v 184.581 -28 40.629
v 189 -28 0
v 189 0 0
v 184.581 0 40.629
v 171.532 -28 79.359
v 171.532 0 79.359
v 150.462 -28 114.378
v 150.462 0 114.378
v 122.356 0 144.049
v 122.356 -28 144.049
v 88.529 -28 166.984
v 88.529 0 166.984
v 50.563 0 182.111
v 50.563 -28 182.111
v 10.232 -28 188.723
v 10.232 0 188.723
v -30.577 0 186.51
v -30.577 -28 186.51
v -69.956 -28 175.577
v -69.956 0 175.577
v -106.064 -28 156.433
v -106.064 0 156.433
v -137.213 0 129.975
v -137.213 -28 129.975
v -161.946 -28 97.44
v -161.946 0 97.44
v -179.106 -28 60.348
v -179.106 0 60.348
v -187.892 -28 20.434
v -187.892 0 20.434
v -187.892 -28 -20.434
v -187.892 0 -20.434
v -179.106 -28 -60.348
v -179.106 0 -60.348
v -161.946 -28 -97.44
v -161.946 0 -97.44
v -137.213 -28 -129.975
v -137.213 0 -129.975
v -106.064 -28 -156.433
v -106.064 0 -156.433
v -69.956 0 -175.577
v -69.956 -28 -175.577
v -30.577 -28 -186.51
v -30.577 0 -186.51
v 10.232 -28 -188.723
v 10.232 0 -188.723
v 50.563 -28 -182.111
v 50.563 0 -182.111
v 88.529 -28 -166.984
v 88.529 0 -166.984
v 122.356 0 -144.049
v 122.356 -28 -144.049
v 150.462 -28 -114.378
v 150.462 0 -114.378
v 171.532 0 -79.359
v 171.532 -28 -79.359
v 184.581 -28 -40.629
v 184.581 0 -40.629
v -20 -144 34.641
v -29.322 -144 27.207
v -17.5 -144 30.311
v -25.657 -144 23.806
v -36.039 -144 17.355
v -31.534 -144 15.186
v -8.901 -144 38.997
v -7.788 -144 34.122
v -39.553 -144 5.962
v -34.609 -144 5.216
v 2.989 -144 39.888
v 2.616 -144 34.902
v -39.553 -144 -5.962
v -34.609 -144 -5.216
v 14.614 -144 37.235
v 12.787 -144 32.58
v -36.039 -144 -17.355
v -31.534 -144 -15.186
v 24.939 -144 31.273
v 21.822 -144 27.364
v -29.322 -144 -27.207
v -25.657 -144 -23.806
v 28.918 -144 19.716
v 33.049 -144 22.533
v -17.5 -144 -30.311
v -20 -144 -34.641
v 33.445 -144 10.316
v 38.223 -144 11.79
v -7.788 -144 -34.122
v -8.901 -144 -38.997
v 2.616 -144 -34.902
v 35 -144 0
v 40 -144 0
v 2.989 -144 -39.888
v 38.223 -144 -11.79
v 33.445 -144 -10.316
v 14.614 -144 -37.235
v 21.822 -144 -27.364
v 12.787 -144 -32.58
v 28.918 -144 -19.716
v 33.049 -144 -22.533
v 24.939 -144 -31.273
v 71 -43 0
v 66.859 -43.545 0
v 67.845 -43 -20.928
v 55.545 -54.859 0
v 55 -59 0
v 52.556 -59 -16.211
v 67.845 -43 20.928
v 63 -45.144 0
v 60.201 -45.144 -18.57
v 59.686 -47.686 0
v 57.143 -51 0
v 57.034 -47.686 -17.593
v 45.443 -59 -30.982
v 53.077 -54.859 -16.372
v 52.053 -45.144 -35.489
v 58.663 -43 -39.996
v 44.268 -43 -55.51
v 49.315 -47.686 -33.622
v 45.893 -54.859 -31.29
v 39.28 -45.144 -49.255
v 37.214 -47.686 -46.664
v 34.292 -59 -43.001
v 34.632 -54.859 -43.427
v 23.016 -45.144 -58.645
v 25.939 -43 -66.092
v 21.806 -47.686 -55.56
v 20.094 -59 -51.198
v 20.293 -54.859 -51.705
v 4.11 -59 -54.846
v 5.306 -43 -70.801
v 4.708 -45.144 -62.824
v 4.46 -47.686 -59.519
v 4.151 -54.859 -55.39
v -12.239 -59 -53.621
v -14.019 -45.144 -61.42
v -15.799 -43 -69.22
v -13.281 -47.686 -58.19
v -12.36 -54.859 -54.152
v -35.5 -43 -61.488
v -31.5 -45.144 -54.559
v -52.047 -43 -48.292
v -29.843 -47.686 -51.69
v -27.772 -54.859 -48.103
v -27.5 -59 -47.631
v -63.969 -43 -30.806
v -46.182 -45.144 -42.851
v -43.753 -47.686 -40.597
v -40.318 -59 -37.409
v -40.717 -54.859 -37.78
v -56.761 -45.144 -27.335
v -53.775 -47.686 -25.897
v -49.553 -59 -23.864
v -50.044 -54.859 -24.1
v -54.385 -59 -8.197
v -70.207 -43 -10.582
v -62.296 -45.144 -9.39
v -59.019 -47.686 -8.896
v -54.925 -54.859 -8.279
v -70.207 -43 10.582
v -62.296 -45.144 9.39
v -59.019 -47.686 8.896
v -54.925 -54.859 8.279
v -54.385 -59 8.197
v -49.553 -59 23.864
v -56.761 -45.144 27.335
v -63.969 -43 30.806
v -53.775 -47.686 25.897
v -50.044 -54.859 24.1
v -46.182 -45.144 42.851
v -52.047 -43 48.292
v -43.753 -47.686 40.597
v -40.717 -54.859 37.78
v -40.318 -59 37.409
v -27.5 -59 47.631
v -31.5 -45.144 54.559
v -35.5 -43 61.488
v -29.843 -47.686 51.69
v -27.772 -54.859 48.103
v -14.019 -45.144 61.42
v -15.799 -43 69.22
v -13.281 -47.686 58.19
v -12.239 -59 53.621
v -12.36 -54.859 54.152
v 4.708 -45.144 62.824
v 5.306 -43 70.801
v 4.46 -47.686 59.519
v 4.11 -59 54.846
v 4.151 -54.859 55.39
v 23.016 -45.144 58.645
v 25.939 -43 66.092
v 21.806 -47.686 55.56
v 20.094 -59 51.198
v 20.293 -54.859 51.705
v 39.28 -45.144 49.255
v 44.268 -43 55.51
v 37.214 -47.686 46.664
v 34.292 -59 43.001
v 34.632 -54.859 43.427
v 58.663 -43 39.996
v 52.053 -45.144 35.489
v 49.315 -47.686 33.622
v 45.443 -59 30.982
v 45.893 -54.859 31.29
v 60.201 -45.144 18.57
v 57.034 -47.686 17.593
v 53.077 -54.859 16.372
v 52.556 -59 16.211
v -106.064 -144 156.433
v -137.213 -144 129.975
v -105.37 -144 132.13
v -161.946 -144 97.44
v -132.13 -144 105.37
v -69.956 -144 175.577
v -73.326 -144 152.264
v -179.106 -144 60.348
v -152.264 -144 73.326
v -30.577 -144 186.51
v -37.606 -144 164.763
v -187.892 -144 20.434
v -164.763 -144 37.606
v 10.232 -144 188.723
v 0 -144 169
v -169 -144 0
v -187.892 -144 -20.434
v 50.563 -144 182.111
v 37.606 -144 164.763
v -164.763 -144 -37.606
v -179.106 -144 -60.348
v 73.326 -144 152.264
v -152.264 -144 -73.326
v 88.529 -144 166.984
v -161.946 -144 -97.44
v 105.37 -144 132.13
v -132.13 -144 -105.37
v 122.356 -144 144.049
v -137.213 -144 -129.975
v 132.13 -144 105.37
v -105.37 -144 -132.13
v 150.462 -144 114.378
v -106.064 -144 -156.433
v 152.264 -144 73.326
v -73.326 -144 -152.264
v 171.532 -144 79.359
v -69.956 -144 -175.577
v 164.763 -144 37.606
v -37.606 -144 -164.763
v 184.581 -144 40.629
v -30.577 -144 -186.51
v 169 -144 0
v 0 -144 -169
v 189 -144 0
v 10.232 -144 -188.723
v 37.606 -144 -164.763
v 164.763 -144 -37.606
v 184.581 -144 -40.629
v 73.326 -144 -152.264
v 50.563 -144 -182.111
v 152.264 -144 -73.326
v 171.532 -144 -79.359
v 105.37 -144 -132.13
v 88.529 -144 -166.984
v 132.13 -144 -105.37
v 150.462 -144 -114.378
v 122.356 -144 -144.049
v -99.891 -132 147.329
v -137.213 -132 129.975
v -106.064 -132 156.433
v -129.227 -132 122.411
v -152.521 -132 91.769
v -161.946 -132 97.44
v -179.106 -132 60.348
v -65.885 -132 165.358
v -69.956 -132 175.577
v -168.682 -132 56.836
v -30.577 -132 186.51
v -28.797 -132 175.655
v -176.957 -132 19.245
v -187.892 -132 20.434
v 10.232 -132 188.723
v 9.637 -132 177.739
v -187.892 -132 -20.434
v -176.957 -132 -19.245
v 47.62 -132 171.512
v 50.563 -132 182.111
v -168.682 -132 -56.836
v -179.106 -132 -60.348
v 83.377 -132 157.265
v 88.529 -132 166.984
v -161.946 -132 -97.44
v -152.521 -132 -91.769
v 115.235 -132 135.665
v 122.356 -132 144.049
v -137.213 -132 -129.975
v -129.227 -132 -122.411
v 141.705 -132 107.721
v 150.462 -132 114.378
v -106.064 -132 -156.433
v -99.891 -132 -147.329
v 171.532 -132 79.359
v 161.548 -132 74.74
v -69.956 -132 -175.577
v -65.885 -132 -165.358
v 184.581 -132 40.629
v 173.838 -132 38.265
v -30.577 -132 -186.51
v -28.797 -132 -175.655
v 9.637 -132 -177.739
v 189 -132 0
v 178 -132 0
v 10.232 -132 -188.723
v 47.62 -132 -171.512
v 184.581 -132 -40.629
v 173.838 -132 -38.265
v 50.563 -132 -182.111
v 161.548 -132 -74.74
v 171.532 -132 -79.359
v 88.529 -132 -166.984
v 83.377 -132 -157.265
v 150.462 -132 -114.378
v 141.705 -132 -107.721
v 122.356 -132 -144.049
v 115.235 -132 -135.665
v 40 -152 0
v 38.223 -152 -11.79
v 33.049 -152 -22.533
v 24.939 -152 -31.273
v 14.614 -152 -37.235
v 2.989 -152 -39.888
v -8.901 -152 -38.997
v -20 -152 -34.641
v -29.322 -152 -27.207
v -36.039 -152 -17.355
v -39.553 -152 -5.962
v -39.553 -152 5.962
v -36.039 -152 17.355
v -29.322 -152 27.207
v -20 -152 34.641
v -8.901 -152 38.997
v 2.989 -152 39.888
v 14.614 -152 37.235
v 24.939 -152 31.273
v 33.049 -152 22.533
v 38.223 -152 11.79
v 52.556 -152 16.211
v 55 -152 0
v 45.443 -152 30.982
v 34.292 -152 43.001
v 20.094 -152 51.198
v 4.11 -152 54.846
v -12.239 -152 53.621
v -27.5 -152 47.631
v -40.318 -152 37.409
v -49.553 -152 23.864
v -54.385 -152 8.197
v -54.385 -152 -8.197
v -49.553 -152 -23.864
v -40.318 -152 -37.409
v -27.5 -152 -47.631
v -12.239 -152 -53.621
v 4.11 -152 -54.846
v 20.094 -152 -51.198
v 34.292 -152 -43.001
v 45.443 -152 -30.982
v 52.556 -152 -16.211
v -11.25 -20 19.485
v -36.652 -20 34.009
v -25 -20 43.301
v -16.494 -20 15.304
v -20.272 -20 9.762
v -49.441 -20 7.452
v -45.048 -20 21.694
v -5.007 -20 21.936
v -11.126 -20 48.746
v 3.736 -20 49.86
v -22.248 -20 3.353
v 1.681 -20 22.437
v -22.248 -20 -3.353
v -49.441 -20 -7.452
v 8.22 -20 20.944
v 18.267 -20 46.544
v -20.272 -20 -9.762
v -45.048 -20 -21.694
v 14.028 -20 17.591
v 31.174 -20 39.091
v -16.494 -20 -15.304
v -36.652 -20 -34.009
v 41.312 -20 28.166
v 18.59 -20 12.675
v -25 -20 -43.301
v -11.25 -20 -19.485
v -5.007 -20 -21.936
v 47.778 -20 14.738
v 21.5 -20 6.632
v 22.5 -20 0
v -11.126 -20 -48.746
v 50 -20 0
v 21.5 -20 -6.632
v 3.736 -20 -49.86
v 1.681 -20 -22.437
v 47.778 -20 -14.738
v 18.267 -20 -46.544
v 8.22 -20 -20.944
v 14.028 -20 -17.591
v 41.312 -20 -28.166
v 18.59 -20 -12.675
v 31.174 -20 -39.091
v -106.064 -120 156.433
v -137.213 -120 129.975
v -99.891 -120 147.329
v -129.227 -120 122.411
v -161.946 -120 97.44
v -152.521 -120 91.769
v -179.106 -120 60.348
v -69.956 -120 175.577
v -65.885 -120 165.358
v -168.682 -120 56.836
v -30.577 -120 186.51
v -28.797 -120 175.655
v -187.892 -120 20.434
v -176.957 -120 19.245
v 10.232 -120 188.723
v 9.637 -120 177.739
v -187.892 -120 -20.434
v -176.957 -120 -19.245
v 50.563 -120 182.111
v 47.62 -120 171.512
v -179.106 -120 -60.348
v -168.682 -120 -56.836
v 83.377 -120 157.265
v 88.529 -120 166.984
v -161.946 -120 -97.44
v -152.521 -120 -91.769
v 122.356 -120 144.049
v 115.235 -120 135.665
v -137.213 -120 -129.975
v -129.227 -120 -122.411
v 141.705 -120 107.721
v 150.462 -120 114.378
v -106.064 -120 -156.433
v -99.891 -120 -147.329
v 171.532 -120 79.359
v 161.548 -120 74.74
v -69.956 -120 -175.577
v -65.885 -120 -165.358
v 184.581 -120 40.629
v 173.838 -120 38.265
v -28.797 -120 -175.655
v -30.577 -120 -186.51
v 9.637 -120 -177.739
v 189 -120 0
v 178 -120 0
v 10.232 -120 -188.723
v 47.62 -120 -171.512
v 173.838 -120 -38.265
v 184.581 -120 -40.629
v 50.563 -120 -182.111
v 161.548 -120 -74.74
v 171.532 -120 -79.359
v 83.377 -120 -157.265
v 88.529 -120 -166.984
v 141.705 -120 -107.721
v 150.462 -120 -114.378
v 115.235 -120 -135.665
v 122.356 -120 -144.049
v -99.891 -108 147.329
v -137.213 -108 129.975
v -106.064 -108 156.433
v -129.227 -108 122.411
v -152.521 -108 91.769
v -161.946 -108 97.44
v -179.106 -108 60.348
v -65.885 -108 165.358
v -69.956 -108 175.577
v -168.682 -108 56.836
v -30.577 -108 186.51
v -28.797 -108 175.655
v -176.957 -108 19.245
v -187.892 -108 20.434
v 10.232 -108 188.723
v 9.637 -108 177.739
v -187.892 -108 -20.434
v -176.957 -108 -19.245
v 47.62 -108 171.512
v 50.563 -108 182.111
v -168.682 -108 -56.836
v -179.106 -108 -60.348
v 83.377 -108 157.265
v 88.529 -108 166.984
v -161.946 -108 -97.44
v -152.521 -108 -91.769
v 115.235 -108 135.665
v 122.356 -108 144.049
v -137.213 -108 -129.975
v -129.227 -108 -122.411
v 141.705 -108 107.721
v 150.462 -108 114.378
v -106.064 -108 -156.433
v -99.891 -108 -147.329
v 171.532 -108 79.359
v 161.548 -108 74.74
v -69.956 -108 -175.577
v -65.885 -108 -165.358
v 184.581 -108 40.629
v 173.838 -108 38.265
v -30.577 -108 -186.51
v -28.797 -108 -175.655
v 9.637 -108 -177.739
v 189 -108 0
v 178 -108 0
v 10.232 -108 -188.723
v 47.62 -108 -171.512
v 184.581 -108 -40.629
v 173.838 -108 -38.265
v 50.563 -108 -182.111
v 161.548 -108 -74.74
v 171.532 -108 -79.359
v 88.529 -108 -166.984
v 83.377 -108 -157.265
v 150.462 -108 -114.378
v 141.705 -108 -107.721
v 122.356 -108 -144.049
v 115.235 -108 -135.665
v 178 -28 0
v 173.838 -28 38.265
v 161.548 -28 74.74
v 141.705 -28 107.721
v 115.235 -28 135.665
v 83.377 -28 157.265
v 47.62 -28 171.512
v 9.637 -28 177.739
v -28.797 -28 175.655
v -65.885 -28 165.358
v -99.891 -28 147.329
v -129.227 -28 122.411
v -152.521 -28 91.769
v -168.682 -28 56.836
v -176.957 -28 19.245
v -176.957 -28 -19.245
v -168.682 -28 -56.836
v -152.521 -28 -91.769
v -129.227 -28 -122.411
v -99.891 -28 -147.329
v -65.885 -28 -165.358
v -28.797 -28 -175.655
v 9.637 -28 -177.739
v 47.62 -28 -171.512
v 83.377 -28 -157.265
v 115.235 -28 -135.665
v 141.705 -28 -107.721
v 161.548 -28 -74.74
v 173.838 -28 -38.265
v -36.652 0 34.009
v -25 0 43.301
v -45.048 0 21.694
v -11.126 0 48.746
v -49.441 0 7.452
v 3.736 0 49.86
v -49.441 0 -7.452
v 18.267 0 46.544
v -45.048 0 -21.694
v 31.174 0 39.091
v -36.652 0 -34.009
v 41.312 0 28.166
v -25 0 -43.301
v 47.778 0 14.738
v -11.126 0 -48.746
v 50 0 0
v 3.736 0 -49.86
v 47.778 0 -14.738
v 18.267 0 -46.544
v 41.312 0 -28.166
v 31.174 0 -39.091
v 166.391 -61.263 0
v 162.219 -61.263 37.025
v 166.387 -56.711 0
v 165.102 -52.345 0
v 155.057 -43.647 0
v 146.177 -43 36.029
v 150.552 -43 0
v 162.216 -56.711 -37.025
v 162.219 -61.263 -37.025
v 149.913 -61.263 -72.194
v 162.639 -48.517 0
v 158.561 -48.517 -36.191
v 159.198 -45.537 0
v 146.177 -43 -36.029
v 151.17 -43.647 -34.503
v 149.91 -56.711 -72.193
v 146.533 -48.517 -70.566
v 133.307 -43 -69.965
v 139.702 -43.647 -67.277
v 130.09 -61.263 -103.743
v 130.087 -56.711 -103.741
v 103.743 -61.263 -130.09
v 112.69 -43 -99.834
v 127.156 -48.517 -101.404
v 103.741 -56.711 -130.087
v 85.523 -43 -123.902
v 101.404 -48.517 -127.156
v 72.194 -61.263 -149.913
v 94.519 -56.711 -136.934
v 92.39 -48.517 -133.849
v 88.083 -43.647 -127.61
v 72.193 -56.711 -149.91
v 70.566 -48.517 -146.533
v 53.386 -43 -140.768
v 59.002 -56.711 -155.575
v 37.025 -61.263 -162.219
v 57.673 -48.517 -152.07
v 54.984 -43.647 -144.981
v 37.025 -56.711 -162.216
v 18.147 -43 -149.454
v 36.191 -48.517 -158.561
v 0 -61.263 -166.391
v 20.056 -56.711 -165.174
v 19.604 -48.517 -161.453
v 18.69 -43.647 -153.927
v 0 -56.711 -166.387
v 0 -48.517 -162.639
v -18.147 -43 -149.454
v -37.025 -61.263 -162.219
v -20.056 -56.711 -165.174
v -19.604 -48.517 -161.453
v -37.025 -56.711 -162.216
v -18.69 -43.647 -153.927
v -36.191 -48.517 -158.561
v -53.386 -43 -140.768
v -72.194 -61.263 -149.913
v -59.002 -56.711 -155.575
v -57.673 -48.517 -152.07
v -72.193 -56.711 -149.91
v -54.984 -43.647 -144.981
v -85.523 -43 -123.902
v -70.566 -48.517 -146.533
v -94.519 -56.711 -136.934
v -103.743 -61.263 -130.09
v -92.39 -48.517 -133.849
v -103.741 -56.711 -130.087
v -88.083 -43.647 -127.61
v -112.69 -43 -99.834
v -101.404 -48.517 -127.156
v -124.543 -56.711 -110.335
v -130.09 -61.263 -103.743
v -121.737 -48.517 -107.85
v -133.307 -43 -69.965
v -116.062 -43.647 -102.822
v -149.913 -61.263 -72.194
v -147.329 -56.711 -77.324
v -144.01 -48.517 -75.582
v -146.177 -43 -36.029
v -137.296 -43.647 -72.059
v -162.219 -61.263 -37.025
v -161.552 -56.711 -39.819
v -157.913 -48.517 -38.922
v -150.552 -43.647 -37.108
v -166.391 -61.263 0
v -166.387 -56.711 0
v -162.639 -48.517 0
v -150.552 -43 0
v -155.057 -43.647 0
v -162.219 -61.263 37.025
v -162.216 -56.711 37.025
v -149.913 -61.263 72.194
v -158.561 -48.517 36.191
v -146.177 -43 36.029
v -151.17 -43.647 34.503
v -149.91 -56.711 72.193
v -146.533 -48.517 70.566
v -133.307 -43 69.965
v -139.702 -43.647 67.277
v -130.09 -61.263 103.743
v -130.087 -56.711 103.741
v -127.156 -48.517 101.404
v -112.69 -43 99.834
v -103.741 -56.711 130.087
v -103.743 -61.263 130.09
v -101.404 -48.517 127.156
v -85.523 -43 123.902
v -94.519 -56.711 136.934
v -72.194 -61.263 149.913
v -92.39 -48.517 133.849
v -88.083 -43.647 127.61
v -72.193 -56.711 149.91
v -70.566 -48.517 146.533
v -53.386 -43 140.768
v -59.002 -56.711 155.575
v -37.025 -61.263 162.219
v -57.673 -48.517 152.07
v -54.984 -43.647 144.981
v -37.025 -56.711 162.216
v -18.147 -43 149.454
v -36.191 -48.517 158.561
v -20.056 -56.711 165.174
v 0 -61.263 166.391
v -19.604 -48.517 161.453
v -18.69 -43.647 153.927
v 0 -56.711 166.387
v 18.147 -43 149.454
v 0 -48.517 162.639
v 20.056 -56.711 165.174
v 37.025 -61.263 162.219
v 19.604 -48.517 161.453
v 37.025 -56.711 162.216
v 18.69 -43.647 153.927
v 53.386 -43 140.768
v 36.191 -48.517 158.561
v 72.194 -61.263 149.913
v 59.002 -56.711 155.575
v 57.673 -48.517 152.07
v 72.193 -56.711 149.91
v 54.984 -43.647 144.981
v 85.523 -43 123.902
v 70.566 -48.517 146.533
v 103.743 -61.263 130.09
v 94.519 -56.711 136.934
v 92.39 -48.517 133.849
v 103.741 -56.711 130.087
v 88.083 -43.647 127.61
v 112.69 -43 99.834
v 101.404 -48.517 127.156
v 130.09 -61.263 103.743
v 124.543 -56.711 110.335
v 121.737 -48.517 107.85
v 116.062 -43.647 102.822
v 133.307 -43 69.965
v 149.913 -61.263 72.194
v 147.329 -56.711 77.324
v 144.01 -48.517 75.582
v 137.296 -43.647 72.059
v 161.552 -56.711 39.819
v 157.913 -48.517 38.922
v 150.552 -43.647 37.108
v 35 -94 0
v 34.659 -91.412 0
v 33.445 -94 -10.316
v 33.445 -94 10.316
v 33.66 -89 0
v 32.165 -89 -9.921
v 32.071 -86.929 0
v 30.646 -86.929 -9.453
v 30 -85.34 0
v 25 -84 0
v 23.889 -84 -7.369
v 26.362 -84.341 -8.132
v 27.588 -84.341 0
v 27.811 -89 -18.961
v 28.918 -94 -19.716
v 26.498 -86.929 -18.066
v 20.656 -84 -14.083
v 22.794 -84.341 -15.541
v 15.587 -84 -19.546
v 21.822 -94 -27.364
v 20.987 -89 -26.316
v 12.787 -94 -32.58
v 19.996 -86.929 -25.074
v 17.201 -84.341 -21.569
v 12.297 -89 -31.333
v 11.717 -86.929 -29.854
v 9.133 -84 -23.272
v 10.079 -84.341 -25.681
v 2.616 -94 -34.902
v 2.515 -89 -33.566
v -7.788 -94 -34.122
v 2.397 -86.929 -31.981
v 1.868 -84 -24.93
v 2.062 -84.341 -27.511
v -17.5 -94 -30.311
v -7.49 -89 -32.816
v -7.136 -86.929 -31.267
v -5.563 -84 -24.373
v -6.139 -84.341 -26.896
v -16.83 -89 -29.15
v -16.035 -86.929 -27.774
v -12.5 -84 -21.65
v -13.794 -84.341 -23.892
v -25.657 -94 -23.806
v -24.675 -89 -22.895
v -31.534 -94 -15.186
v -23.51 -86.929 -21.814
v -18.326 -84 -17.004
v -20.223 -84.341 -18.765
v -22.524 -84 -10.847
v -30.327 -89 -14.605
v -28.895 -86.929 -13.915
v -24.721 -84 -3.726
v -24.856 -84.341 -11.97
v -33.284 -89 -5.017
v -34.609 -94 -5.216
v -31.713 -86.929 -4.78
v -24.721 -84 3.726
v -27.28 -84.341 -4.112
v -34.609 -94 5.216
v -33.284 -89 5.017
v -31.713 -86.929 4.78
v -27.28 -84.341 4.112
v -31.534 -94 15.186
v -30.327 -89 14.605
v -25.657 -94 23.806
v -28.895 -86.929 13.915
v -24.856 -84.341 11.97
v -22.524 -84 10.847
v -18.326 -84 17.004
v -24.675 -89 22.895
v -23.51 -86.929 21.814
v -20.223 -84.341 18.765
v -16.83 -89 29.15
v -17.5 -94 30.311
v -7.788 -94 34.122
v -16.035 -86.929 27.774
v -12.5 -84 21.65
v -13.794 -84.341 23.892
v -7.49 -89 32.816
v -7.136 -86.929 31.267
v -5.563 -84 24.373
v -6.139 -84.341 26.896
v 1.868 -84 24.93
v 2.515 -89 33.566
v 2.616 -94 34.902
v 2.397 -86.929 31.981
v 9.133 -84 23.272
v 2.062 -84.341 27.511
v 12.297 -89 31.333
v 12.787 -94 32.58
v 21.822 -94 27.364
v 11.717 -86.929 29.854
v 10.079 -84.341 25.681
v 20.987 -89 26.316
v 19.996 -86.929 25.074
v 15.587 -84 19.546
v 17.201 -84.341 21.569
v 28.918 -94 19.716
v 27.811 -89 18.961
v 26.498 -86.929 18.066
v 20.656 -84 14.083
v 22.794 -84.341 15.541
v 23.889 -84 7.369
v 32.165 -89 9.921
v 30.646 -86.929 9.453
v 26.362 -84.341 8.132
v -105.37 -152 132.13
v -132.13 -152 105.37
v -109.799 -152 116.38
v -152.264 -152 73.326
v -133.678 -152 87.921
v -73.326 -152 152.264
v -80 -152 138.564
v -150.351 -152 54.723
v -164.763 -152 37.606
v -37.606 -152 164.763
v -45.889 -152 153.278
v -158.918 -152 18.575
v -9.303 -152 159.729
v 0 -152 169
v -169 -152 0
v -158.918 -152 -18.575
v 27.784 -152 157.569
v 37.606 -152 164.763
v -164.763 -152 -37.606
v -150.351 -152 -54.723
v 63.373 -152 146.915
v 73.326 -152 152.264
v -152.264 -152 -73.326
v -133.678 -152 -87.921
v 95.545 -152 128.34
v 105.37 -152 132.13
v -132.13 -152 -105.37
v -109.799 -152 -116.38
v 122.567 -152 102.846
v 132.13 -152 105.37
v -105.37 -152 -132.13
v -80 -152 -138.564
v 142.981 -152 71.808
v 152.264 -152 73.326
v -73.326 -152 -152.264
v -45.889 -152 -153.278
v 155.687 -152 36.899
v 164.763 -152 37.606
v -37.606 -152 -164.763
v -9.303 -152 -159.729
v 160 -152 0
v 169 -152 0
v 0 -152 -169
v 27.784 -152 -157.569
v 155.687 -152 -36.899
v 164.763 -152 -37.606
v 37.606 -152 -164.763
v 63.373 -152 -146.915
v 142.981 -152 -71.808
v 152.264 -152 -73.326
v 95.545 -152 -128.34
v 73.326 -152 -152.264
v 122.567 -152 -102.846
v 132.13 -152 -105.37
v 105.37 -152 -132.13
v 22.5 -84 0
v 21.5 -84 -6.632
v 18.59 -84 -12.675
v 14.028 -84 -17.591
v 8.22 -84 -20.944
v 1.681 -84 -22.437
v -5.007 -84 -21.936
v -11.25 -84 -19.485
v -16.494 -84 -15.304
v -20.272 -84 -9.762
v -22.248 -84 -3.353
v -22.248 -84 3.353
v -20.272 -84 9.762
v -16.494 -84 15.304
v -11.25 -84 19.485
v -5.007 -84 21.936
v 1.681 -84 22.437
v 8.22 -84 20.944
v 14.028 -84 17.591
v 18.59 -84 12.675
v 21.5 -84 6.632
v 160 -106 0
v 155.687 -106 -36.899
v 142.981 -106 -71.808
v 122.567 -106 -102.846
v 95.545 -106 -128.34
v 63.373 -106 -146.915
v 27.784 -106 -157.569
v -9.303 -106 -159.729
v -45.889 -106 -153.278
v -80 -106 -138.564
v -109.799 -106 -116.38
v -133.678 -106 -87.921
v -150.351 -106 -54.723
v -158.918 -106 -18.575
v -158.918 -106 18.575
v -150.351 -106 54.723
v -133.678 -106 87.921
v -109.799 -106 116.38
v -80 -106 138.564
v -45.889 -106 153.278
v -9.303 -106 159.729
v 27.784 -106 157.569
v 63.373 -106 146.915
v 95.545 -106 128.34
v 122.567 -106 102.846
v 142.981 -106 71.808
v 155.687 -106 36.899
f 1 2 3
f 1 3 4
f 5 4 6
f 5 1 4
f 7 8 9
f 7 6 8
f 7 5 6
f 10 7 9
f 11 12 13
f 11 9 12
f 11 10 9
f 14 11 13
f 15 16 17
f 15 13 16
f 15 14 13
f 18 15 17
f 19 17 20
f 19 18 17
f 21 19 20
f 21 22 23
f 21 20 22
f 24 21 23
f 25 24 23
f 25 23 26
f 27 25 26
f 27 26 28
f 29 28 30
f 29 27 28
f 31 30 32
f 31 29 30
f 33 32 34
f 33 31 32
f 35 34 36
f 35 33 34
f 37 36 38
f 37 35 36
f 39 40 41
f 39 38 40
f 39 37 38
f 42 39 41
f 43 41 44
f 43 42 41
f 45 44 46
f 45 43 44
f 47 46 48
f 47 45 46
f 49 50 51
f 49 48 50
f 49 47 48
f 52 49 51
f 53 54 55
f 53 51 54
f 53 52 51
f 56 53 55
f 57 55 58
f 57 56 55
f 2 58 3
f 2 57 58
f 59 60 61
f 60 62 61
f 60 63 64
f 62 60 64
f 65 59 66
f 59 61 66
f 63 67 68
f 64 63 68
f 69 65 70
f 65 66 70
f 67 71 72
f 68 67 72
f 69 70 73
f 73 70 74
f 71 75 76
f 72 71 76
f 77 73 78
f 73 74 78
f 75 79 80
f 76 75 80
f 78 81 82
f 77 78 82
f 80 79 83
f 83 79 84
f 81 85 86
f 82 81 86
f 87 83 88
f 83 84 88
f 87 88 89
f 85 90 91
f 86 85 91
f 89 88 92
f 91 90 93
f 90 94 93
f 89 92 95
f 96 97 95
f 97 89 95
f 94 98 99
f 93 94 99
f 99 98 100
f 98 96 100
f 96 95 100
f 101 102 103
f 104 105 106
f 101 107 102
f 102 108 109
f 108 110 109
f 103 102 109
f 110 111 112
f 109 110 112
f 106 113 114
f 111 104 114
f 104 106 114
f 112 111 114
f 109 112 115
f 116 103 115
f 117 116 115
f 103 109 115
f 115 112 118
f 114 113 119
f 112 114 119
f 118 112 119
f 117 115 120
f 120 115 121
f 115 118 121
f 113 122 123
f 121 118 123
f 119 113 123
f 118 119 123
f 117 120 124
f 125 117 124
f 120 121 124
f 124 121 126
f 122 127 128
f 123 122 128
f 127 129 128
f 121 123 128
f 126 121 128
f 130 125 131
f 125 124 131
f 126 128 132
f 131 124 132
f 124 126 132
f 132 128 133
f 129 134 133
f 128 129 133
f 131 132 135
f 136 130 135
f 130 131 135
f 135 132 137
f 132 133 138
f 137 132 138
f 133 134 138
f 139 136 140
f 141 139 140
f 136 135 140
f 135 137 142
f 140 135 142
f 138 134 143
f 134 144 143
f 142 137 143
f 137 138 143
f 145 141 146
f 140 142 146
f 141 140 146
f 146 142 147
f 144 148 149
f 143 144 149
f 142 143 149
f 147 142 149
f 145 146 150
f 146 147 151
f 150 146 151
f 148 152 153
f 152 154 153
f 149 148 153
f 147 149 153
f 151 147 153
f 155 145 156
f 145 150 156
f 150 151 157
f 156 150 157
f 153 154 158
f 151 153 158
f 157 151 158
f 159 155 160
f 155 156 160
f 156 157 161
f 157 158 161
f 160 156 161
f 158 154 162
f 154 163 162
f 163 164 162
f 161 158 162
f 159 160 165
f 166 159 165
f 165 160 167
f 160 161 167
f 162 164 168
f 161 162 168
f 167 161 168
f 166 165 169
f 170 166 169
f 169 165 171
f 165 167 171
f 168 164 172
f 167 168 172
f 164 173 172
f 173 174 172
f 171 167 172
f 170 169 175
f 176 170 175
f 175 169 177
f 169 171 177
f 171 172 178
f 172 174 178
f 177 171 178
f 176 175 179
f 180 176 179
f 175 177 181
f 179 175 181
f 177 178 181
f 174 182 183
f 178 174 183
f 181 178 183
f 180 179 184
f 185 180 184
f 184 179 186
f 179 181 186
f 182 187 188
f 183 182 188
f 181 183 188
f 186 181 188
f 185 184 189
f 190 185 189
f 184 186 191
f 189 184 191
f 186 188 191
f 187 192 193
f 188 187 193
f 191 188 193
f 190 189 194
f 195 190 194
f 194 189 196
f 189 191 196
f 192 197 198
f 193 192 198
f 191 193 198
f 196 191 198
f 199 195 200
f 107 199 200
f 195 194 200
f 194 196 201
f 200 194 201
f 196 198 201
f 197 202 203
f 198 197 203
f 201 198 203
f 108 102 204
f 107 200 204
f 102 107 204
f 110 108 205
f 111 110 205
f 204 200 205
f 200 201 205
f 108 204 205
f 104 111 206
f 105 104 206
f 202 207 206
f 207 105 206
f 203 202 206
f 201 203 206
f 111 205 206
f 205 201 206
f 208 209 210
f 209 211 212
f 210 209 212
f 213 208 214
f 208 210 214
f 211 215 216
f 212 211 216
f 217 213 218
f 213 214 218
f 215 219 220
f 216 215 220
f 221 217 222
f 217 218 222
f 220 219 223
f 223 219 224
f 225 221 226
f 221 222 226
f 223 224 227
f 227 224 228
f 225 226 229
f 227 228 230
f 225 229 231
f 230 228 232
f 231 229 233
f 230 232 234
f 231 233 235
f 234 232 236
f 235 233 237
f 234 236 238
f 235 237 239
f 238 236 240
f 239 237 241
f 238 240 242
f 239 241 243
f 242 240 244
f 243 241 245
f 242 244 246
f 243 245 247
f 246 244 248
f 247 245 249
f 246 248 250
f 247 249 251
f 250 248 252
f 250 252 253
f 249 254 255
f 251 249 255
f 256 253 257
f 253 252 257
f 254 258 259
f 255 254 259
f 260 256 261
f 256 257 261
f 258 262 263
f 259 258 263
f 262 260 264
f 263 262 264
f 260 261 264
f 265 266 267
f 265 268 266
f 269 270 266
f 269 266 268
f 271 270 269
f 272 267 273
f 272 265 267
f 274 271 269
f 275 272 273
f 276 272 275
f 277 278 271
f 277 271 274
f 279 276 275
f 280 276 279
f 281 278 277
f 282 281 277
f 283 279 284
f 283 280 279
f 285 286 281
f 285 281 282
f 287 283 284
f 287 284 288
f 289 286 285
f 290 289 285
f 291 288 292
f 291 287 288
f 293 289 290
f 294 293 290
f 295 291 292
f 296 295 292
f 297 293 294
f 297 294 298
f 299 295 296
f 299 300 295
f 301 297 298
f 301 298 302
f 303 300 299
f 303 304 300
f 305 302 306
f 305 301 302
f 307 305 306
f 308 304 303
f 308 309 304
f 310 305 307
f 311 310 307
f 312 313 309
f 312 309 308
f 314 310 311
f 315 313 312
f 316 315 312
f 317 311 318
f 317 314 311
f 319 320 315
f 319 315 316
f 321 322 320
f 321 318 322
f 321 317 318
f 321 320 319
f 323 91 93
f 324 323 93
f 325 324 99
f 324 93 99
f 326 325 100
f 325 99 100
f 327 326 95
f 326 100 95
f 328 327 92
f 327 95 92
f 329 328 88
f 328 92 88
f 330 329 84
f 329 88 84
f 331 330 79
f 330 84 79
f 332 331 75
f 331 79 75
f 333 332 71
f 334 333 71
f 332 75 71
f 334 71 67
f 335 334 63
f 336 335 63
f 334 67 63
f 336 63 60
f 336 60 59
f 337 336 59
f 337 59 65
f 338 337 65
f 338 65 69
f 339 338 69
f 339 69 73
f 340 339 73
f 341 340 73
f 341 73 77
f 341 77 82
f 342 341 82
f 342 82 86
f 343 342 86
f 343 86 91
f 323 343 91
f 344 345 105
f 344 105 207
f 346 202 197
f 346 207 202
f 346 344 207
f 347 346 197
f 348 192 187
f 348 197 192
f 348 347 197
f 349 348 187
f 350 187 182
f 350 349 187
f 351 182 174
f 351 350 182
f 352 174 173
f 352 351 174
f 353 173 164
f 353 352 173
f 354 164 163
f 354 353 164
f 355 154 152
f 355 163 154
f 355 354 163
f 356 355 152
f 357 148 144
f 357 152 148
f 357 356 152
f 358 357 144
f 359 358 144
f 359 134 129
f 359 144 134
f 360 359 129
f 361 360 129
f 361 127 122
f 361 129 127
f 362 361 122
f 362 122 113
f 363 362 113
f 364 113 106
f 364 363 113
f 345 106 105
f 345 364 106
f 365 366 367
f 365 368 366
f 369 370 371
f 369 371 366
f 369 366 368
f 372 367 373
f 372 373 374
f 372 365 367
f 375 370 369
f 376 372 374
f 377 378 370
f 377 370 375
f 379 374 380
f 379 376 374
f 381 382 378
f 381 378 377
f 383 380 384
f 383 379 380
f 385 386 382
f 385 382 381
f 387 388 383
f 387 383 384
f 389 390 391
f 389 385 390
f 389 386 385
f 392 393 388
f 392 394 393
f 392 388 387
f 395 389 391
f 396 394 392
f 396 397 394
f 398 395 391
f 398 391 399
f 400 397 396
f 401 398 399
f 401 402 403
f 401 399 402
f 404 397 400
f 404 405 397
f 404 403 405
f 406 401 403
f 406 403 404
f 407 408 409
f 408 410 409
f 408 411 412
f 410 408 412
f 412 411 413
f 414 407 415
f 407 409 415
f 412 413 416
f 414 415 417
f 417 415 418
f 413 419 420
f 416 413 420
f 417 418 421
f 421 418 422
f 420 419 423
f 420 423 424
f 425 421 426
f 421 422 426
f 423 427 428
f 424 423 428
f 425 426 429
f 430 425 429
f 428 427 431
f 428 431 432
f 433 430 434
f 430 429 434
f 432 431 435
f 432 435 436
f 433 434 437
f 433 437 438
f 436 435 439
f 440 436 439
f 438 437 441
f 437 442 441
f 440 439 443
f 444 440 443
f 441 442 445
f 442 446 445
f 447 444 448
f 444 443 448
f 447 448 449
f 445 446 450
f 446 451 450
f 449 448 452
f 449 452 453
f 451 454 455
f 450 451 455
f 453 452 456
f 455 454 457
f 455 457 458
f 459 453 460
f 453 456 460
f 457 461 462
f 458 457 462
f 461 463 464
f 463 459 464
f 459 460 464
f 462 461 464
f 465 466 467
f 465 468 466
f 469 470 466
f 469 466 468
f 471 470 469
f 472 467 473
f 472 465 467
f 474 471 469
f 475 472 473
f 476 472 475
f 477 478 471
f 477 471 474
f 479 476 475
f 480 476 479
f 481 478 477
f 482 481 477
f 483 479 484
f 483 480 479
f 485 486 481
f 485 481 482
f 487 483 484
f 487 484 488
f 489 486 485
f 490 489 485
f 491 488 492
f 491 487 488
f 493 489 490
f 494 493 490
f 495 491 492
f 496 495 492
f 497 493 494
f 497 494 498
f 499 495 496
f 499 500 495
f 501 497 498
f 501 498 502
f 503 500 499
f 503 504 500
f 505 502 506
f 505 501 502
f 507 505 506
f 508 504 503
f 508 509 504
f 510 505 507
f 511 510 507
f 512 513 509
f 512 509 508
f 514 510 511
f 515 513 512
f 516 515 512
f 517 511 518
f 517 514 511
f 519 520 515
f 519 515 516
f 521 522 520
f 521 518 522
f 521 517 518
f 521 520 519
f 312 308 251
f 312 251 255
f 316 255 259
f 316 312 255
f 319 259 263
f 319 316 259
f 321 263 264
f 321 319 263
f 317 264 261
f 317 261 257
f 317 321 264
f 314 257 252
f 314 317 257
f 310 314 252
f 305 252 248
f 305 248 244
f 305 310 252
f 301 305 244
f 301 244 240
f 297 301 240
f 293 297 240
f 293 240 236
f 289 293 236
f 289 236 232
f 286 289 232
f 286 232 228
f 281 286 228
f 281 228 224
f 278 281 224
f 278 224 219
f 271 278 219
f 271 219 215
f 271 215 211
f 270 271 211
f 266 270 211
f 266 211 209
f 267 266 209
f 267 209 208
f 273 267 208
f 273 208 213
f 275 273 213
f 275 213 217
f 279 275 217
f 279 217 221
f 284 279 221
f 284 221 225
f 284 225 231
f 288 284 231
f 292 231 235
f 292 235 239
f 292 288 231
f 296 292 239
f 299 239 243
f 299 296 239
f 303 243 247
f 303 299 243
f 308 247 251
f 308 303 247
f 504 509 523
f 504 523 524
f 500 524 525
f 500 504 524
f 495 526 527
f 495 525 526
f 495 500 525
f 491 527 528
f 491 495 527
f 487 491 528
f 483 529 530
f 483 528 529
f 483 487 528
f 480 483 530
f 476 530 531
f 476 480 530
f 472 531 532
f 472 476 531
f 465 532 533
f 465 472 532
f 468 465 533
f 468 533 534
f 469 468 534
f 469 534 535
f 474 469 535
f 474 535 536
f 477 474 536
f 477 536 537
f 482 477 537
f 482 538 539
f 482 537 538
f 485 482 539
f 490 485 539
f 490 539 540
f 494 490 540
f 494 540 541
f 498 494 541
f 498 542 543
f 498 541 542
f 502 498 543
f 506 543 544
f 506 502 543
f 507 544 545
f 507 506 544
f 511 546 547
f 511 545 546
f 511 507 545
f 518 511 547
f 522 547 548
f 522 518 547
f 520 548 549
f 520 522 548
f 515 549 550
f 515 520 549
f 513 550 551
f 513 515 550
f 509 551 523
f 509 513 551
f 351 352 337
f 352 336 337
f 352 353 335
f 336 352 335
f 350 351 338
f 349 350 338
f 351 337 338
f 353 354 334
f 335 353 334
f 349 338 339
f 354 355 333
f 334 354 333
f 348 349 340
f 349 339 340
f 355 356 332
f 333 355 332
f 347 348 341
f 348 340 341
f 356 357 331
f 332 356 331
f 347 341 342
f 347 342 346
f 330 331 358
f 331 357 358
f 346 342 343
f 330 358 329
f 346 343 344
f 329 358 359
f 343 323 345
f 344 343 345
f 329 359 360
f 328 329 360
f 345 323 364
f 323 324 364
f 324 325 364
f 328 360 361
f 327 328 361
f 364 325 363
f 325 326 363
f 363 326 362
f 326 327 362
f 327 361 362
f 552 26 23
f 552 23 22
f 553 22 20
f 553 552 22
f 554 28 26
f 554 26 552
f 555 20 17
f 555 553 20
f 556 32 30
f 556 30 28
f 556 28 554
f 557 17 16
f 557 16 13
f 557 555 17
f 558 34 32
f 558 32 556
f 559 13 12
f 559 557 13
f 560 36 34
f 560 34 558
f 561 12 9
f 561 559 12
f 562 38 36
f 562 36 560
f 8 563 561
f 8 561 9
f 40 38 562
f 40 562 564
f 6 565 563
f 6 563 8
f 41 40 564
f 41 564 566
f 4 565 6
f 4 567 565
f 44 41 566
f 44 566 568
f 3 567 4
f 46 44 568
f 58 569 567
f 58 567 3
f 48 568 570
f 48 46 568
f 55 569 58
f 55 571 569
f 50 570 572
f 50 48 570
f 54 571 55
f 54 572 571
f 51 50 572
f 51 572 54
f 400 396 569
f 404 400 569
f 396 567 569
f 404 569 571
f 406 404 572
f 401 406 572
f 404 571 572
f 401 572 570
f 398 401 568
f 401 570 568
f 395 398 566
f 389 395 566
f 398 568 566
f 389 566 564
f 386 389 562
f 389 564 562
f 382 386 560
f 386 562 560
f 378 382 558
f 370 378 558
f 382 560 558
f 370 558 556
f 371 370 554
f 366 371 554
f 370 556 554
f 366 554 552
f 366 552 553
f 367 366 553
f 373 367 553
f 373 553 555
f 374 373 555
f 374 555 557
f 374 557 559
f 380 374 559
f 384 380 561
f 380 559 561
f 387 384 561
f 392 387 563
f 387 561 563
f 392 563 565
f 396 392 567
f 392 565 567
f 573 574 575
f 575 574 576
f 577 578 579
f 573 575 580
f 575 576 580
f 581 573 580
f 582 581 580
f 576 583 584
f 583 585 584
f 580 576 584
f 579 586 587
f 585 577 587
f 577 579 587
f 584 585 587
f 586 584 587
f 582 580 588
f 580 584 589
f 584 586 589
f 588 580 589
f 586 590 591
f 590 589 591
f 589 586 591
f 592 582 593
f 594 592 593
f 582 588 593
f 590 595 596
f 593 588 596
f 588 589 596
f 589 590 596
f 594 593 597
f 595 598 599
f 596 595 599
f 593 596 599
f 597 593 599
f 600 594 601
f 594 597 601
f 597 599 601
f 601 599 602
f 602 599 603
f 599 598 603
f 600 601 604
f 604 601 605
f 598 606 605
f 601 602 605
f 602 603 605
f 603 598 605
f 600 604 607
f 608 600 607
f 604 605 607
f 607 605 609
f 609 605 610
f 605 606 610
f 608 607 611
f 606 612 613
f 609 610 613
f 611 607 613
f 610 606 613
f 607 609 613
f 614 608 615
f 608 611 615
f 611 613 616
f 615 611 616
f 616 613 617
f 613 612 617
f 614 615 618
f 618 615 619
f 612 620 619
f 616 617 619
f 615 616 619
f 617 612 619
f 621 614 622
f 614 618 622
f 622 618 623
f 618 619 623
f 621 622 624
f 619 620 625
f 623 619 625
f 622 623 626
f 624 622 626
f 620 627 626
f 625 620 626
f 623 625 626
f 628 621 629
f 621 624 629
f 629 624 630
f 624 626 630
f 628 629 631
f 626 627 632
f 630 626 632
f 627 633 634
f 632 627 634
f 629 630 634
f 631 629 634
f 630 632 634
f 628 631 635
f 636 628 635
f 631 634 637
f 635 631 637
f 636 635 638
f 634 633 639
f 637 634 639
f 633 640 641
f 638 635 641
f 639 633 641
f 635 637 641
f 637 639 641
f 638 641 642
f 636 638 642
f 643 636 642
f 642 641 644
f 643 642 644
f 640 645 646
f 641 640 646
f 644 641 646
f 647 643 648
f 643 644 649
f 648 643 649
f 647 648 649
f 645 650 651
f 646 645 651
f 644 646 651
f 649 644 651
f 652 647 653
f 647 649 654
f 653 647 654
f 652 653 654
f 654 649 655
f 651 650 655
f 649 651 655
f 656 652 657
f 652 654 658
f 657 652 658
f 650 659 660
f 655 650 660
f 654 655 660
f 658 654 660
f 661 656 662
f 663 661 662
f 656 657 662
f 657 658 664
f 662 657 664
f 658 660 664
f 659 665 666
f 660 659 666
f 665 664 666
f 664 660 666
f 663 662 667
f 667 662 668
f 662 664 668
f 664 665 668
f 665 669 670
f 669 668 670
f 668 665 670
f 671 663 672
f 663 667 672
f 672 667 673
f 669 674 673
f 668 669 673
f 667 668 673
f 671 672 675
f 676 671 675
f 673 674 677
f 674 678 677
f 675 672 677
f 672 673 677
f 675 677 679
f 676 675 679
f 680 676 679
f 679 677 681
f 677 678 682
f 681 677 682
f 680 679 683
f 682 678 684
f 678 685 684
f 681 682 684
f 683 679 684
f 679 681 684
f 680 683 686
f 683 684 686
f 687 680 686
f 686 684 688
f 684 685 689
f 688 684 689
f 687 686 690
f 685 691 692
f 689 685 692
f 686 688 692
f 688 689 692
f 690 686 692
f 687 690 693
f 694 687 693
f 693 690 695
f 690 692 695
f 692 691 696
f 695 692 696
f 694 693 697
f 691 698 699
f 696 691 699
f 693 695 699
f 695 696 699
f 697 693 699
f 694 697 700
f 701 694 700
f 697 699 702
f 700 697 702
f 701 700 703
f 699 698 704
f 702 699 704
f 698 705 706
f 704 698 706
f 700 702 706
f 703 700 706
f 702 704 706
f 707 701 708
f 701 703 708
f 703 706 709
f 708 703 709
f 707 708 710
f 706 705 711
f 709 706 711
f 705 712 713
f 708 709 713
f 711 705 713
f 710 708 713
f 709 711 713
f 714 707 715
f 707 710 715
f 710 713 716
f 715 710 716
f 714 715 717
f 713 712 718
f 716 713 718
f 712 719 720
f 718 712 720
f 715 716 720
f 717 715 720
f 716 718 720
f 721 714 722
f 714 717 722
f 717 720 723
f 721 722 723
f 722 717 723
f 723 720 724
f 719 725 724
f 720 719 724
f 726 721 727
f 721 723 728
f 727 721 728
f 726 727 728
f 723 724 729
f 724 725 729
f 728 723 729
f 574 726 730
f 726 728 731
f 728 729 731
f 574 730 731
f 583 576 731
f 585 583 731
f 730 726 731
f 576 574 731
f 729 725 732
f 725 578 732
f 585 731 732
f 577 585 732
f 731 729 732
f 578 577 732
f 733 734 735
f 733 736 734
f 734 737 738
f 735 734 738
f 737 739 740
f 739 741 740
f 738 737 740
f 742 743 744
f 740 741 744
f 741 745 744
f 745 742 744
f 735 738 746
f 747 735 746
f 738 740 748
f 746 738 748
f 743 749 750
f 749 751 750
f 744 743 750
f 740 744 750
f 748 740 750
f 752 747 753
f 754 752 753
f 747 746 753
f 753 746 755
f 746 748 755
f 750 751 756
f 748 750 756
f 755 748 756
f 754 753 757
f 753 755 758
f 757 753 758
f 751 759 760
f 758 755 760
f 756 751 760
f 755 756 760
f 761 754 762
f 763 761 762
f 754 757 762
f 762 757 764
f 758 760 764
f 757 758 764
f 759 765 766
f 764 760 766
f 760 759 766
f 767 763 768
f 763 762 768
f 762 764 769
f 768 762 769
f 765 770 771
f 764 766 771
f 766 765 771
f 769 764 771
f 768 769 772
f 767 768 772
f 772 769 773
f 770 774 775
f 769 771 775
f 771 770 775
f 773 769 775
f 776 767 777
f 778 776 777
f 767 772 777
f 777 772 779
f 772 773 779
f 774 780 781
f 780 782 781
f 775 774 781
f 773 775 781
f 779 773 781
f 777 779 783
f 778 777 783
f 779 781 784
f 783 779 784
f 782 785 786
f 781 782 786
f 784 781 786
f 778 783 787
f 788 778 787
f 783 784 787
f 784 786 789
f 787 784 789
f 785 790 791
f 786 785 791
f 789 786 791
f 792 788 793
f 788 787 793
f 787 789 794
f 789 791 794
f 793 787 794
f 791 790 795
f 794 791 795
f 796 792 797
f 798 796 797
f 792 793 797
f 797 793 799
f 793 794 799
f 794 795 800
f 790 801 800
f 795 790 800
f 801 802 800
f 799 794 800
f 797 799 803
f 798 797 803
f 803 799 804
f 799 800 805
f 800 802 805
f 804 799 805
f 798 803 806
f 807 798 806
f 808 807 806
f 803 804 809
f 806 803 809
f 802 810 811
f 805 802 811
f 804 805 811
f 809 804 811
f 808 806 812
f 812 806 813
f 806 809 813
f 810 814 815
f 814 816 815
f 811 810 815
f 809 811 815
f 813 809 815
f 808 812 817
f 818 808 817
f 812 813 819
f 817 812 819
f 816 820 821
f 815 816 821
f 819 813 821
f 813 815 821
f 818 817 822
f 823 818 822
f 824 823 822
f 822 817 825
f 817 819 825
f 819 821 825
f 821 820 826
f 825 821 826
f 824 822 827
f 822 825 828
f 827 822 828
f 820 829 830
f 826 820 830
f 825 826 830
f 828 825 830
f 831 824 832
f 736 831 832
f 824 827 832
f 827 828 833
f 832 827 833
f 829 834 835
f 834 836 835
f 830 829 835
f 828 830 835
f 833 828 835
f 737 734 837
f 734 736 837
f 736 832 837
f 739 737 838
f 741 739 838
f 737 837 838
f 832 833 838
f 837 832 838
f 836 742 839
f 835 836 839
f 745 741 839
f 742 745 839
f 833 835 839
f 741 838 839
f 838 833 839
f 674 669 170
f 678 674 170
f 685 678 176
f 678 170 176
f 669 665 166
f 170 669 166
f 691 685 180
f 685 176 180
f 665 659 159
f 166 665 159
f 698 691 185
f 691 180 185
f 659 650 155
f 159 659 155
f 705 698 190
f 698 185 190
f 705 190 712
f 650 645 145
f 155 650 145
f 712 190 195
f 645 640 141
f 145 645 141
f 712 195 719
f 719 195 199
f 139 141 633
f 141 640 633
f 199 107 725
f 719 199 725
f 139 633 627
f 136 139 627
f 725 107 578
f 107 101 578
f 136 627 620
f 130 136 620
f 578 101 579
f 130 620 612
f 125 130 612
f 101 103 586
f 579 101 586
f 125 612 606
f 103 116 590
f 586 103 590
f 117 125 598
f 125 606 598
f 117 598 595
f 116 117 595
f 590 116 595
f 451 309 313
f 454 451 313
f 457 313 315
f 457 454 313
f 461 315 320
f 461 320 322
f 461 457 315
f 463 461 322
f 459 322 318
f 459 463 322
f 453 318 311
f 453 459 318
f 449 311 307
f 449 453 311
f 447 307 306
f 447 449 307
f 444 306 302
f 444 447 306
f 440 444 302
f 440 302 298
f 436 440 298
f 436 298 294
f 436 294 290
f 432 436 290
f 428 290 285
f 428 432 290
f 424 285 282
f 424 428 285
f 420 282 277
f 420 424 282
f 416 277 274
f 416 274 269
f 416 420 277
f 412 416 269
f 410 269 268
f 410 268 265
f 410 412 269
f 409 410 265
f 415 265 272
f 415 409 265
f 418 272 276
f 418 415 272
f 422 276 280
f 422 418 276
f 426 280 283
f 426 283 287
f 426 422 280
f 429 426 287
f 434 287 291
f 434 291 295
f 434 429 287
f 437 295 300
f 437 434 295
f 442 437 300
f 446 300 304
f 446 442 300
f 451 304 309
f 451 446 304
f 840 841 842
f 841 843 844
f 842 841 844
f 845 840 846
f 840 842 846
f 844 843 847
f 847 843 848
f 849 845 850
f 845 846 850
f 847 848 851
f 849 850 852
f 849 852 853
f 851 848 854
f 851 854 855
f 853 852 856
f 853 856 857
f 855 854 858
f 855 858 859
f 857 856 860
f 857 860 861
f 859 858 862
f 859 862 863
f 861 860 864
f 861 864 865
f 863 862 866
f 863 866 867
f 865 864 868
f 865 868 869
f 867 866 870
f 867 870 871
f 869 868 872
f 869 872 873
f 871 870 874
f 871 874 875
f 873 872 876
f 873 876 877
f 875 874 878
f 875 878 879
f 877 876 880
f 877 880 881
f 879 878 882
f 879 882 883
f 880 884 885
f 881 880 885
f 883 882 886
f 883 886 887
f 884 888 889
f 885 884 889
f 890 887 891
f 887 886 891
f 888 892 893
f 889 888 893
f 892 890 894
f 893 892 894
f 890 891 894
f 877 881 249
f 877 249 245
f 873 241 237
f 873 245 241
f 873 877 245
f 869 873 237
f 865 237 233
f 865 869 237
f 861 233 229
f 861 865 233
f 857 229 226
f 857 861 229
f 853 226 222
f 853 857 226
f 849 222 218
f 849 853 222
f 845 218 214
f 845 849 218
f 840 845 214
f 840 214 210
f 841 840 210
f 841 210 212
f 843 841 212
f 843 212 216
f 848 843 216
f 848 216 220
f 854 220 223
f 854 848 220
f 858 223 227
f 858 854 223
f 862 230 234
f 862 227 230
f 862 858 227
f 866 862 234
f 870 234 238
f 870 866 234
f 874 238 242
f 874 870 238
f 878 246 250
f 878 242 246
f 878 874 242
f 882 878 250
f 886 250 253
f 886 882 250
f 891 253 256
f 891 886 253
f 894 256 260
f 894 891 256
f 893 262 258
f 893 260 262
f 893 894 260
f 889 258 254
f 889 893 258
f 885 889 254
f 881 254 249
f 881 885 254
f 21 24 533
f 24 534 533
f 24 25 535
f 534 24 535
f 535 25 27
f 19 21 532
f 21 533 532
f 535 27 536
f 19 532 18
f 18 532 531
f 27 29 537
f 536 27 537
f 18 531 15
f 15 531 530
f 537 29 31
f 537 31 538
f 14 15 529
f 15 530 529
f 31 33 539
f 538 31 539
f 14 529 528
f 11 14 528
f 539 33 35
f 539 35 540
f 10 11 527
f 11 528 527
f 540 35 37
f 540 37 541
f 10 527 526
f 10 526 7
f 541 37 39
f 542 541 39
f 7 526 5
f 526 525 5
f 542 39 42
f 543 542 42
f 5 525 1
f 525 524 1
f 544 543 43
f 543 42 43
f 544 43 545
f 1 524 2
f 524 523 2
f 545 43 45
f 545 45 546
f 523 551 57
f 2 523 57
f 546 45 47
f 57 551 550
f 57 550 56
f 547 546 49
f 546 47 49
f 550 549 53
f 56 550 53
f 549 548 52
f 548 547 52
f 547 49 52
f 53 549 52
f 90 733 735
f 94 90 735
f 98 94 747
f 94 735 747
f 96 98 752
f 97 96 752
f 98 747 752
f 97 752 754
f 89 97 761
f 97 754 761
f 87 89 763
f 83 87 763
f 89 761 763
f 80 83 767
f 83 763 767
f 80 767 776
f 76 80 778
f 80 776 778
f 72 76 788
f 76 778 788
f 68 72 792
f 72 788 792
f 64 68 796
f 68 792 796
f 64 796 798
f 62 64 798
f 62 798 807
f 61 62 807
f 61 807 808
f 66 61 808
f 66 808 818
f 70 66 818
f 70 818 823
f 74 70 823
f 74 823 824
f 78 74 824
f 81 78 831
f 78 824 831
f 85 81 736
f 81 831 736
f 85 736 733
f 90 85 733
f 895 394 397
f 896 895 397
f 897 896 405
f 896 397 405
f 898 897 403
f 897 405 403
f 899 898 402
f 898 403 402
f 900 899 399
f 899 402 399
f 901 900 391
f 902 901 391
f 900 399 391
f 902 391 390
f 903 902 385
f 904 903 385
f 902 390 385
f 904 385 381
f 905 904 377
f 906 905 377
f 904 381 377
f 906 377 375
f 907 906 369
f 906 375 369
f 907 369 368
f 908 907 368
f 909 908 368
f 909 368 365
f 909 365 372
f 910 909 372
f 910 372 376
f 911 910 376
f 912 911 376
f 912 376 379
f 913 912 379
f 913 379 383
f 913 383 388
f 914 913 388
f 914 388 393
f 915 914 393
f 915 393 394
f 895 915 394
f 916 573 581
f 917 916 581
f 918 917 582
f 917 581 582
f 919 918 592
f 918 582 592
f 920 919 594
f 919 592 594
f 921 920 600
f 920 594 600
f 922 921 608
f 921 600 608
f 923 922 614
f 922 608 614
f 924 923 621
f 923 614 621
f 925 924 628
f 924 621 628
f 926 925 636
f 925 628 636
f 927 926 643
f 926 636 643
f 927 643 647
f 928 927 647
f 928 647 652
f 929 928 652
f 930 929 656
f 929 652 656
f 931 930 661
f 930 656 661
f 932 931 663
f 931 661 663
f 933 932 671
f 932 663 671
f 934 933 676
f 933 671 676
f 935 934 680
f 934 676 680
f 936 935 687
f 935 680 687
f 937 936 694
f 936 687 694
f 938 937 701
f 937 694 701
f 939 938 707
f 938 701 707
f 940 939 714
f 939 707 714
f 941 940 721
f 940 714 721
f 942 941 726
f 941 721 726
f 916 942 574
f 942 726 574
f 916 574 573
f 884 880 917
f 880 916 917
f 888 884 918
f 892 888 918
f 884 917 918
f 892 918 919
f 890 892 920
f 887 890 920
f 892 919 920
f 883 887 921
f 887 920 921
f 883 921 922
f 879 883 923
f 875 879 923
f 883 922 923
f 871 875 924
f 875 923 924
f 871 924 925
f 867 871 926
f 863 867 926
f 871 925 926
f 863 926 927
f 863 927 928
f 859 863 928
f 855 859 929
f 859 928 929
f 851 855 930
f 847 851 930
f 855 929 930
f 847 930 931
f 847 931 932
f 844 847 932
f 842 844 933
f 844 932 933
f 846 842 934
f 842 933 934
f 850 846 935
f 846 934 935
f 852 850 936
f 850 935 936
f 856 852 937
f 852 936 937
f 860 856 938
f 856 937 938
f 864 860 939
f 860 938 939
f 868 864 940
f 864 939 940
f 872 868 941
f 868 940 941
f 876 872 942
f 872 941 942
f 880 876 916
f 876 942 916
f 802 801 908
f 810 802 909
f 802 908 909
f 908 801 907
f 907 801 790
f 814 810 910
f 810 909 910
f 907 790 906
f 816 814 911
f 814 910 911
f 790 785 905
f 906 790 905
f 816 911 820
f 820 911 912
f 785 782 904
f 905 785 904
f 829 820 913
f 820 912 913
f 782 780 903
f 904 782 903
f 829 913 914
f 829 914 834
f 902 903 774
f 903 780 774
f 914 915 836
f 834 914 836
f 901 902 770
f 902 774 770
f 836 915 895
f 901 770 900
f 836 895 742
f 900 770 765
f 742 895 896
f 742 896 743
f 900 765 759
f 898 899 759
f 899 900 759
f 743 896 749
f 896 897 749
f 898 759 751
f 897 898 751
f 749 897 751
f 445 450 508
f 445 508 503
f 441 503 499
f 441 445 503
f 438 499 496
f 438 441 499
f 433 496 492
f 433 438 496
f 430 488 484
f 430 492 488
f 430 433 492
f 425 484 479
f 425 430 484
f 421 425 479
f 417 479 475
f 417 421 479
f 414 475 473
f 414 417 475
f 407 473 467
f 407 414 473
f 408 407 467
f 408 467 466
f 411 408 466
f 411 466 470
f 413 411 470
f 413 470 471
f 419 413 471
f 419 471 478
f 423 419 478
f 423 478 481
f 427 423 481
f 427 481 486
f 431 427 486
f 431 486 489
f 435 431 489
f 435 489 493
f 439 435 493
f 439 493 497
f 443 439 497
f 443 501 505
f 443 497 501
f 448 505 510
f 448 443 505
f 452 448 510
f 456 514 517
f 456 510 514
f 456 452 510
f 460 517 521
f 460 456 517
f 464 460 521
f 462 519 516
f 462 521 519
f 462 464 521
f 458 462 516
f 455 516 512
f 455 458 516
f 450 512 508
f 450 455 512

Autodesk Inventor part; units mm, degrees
ref_plane "YZ Plane" through (0, 0, 0) normal (1, 0, 0) x (0, 1, 0)
ref_plane "XZ Plane" through (0, 0, 0) normal (0, 1, 0) x (-1, 0, 0)
ref_plane "XY Plane" through (0, 0, 0) normal (0, 0, 1) x (1, 0, 0)
sketch "Эскиз1" plane through (0, 0, 0) normal (0, 0, 1) x (1, 0, 0)
  line L0 (49.9998, 0) -> (189, 0)
  line L1 (189, 0) -> (189, -28)
  line L2 (189, -28) -> (178, -28)
  line L3 (178, -28) -> (178, -108)
  line L4 (178, -108) -> (189, -108)
  line L5 (150.5518, -43) -> (70.9998, -43)
  line L6 (54.9998, -59) -> (54.9998, -152)
  line L7 (24.9998, -84) -> (22.4998, -84)
  line L8 (22.4998, -84) -> (22.4998, -20)
  line L9 (22.4998, -20) -> (49.9998, -20)
  line L10 (49.9998, -20) -> (49.9998, 0)
  arc A0 (70.9998, -43) -> (54.9998, -59) centre (70.9998, -59) ccw
  line L11 (0, 0) -> (0, 25.6698)
  line L12 (189, -108) -> (189, -120)
  line L13 (189, -144) -> (169, -144)
  line L14 (169, -144) -> (169, -152)
  line L15 (189, -144) -> (189, -132)
  line L16 (189, -132) -> (178, -132)
  line L17 (178, -132) -> (178, -120)
  line L18 (178, -120) -> (189, -120)
  line L19 (189, -108) -> (189, -120)
  line L20 (160, -152) -> (160, -106)
  line L21 (34.9998, -144) -> (34.9998, -94)
  line L22 (169, -152) -> (160, -152)
  line L23 (54.9998, -152) -> (39.9998, -152)
  line L24 (39.9998, -152) -> (39.9998, -144)
  line L25 (39.9998, -144) -> (34.9998, -144)
  arc A1 (34.9998, -94) -> (24.9998, -84) centre (24.9998, -94) ccw
  line L26 (160, -106) -> (166.391, -61.2627)
  arc A2 (166.391, -61.2627) -> (150.5518, -43) centre (150.5518, -59) ccw
  point P0 (54.9998, -43)
  point P1 (34.9998, -98)
  dimension "d0" = 189
  dimension "d1" = 28
  dimension "d2" = 11
  dimension "d3" = 80
  dimension "d17" = 64
  dimension "d18" = 27.5
  dimension "d24" = 16
  dimension "d29" = 20
  dimension "d30" = 8
  dimension "d31" = 12
  dimension "d32" = 11
  dimension "d33" = 12
  dimension "d34" = 12
  dimension "d35" = 46
  dimension "d36" = 93
  dimension "d37" = 46
  dimension "d38" = 15
  dimension "d39" = 20
  dimension "d40" = 5
  dimension "d41" = 8
  dimension "d42" = 10
  dimension "d43" = 9
  dimension "d44" = 169
  dimension "d45" = 16
revolve "Вращение1" add sketch "Эскиз1" angle 360 about axis through (0, 0, 0) along (0, 1, 0)
properties part number "Верхняя часть поршня" material "Чугун, серый"
